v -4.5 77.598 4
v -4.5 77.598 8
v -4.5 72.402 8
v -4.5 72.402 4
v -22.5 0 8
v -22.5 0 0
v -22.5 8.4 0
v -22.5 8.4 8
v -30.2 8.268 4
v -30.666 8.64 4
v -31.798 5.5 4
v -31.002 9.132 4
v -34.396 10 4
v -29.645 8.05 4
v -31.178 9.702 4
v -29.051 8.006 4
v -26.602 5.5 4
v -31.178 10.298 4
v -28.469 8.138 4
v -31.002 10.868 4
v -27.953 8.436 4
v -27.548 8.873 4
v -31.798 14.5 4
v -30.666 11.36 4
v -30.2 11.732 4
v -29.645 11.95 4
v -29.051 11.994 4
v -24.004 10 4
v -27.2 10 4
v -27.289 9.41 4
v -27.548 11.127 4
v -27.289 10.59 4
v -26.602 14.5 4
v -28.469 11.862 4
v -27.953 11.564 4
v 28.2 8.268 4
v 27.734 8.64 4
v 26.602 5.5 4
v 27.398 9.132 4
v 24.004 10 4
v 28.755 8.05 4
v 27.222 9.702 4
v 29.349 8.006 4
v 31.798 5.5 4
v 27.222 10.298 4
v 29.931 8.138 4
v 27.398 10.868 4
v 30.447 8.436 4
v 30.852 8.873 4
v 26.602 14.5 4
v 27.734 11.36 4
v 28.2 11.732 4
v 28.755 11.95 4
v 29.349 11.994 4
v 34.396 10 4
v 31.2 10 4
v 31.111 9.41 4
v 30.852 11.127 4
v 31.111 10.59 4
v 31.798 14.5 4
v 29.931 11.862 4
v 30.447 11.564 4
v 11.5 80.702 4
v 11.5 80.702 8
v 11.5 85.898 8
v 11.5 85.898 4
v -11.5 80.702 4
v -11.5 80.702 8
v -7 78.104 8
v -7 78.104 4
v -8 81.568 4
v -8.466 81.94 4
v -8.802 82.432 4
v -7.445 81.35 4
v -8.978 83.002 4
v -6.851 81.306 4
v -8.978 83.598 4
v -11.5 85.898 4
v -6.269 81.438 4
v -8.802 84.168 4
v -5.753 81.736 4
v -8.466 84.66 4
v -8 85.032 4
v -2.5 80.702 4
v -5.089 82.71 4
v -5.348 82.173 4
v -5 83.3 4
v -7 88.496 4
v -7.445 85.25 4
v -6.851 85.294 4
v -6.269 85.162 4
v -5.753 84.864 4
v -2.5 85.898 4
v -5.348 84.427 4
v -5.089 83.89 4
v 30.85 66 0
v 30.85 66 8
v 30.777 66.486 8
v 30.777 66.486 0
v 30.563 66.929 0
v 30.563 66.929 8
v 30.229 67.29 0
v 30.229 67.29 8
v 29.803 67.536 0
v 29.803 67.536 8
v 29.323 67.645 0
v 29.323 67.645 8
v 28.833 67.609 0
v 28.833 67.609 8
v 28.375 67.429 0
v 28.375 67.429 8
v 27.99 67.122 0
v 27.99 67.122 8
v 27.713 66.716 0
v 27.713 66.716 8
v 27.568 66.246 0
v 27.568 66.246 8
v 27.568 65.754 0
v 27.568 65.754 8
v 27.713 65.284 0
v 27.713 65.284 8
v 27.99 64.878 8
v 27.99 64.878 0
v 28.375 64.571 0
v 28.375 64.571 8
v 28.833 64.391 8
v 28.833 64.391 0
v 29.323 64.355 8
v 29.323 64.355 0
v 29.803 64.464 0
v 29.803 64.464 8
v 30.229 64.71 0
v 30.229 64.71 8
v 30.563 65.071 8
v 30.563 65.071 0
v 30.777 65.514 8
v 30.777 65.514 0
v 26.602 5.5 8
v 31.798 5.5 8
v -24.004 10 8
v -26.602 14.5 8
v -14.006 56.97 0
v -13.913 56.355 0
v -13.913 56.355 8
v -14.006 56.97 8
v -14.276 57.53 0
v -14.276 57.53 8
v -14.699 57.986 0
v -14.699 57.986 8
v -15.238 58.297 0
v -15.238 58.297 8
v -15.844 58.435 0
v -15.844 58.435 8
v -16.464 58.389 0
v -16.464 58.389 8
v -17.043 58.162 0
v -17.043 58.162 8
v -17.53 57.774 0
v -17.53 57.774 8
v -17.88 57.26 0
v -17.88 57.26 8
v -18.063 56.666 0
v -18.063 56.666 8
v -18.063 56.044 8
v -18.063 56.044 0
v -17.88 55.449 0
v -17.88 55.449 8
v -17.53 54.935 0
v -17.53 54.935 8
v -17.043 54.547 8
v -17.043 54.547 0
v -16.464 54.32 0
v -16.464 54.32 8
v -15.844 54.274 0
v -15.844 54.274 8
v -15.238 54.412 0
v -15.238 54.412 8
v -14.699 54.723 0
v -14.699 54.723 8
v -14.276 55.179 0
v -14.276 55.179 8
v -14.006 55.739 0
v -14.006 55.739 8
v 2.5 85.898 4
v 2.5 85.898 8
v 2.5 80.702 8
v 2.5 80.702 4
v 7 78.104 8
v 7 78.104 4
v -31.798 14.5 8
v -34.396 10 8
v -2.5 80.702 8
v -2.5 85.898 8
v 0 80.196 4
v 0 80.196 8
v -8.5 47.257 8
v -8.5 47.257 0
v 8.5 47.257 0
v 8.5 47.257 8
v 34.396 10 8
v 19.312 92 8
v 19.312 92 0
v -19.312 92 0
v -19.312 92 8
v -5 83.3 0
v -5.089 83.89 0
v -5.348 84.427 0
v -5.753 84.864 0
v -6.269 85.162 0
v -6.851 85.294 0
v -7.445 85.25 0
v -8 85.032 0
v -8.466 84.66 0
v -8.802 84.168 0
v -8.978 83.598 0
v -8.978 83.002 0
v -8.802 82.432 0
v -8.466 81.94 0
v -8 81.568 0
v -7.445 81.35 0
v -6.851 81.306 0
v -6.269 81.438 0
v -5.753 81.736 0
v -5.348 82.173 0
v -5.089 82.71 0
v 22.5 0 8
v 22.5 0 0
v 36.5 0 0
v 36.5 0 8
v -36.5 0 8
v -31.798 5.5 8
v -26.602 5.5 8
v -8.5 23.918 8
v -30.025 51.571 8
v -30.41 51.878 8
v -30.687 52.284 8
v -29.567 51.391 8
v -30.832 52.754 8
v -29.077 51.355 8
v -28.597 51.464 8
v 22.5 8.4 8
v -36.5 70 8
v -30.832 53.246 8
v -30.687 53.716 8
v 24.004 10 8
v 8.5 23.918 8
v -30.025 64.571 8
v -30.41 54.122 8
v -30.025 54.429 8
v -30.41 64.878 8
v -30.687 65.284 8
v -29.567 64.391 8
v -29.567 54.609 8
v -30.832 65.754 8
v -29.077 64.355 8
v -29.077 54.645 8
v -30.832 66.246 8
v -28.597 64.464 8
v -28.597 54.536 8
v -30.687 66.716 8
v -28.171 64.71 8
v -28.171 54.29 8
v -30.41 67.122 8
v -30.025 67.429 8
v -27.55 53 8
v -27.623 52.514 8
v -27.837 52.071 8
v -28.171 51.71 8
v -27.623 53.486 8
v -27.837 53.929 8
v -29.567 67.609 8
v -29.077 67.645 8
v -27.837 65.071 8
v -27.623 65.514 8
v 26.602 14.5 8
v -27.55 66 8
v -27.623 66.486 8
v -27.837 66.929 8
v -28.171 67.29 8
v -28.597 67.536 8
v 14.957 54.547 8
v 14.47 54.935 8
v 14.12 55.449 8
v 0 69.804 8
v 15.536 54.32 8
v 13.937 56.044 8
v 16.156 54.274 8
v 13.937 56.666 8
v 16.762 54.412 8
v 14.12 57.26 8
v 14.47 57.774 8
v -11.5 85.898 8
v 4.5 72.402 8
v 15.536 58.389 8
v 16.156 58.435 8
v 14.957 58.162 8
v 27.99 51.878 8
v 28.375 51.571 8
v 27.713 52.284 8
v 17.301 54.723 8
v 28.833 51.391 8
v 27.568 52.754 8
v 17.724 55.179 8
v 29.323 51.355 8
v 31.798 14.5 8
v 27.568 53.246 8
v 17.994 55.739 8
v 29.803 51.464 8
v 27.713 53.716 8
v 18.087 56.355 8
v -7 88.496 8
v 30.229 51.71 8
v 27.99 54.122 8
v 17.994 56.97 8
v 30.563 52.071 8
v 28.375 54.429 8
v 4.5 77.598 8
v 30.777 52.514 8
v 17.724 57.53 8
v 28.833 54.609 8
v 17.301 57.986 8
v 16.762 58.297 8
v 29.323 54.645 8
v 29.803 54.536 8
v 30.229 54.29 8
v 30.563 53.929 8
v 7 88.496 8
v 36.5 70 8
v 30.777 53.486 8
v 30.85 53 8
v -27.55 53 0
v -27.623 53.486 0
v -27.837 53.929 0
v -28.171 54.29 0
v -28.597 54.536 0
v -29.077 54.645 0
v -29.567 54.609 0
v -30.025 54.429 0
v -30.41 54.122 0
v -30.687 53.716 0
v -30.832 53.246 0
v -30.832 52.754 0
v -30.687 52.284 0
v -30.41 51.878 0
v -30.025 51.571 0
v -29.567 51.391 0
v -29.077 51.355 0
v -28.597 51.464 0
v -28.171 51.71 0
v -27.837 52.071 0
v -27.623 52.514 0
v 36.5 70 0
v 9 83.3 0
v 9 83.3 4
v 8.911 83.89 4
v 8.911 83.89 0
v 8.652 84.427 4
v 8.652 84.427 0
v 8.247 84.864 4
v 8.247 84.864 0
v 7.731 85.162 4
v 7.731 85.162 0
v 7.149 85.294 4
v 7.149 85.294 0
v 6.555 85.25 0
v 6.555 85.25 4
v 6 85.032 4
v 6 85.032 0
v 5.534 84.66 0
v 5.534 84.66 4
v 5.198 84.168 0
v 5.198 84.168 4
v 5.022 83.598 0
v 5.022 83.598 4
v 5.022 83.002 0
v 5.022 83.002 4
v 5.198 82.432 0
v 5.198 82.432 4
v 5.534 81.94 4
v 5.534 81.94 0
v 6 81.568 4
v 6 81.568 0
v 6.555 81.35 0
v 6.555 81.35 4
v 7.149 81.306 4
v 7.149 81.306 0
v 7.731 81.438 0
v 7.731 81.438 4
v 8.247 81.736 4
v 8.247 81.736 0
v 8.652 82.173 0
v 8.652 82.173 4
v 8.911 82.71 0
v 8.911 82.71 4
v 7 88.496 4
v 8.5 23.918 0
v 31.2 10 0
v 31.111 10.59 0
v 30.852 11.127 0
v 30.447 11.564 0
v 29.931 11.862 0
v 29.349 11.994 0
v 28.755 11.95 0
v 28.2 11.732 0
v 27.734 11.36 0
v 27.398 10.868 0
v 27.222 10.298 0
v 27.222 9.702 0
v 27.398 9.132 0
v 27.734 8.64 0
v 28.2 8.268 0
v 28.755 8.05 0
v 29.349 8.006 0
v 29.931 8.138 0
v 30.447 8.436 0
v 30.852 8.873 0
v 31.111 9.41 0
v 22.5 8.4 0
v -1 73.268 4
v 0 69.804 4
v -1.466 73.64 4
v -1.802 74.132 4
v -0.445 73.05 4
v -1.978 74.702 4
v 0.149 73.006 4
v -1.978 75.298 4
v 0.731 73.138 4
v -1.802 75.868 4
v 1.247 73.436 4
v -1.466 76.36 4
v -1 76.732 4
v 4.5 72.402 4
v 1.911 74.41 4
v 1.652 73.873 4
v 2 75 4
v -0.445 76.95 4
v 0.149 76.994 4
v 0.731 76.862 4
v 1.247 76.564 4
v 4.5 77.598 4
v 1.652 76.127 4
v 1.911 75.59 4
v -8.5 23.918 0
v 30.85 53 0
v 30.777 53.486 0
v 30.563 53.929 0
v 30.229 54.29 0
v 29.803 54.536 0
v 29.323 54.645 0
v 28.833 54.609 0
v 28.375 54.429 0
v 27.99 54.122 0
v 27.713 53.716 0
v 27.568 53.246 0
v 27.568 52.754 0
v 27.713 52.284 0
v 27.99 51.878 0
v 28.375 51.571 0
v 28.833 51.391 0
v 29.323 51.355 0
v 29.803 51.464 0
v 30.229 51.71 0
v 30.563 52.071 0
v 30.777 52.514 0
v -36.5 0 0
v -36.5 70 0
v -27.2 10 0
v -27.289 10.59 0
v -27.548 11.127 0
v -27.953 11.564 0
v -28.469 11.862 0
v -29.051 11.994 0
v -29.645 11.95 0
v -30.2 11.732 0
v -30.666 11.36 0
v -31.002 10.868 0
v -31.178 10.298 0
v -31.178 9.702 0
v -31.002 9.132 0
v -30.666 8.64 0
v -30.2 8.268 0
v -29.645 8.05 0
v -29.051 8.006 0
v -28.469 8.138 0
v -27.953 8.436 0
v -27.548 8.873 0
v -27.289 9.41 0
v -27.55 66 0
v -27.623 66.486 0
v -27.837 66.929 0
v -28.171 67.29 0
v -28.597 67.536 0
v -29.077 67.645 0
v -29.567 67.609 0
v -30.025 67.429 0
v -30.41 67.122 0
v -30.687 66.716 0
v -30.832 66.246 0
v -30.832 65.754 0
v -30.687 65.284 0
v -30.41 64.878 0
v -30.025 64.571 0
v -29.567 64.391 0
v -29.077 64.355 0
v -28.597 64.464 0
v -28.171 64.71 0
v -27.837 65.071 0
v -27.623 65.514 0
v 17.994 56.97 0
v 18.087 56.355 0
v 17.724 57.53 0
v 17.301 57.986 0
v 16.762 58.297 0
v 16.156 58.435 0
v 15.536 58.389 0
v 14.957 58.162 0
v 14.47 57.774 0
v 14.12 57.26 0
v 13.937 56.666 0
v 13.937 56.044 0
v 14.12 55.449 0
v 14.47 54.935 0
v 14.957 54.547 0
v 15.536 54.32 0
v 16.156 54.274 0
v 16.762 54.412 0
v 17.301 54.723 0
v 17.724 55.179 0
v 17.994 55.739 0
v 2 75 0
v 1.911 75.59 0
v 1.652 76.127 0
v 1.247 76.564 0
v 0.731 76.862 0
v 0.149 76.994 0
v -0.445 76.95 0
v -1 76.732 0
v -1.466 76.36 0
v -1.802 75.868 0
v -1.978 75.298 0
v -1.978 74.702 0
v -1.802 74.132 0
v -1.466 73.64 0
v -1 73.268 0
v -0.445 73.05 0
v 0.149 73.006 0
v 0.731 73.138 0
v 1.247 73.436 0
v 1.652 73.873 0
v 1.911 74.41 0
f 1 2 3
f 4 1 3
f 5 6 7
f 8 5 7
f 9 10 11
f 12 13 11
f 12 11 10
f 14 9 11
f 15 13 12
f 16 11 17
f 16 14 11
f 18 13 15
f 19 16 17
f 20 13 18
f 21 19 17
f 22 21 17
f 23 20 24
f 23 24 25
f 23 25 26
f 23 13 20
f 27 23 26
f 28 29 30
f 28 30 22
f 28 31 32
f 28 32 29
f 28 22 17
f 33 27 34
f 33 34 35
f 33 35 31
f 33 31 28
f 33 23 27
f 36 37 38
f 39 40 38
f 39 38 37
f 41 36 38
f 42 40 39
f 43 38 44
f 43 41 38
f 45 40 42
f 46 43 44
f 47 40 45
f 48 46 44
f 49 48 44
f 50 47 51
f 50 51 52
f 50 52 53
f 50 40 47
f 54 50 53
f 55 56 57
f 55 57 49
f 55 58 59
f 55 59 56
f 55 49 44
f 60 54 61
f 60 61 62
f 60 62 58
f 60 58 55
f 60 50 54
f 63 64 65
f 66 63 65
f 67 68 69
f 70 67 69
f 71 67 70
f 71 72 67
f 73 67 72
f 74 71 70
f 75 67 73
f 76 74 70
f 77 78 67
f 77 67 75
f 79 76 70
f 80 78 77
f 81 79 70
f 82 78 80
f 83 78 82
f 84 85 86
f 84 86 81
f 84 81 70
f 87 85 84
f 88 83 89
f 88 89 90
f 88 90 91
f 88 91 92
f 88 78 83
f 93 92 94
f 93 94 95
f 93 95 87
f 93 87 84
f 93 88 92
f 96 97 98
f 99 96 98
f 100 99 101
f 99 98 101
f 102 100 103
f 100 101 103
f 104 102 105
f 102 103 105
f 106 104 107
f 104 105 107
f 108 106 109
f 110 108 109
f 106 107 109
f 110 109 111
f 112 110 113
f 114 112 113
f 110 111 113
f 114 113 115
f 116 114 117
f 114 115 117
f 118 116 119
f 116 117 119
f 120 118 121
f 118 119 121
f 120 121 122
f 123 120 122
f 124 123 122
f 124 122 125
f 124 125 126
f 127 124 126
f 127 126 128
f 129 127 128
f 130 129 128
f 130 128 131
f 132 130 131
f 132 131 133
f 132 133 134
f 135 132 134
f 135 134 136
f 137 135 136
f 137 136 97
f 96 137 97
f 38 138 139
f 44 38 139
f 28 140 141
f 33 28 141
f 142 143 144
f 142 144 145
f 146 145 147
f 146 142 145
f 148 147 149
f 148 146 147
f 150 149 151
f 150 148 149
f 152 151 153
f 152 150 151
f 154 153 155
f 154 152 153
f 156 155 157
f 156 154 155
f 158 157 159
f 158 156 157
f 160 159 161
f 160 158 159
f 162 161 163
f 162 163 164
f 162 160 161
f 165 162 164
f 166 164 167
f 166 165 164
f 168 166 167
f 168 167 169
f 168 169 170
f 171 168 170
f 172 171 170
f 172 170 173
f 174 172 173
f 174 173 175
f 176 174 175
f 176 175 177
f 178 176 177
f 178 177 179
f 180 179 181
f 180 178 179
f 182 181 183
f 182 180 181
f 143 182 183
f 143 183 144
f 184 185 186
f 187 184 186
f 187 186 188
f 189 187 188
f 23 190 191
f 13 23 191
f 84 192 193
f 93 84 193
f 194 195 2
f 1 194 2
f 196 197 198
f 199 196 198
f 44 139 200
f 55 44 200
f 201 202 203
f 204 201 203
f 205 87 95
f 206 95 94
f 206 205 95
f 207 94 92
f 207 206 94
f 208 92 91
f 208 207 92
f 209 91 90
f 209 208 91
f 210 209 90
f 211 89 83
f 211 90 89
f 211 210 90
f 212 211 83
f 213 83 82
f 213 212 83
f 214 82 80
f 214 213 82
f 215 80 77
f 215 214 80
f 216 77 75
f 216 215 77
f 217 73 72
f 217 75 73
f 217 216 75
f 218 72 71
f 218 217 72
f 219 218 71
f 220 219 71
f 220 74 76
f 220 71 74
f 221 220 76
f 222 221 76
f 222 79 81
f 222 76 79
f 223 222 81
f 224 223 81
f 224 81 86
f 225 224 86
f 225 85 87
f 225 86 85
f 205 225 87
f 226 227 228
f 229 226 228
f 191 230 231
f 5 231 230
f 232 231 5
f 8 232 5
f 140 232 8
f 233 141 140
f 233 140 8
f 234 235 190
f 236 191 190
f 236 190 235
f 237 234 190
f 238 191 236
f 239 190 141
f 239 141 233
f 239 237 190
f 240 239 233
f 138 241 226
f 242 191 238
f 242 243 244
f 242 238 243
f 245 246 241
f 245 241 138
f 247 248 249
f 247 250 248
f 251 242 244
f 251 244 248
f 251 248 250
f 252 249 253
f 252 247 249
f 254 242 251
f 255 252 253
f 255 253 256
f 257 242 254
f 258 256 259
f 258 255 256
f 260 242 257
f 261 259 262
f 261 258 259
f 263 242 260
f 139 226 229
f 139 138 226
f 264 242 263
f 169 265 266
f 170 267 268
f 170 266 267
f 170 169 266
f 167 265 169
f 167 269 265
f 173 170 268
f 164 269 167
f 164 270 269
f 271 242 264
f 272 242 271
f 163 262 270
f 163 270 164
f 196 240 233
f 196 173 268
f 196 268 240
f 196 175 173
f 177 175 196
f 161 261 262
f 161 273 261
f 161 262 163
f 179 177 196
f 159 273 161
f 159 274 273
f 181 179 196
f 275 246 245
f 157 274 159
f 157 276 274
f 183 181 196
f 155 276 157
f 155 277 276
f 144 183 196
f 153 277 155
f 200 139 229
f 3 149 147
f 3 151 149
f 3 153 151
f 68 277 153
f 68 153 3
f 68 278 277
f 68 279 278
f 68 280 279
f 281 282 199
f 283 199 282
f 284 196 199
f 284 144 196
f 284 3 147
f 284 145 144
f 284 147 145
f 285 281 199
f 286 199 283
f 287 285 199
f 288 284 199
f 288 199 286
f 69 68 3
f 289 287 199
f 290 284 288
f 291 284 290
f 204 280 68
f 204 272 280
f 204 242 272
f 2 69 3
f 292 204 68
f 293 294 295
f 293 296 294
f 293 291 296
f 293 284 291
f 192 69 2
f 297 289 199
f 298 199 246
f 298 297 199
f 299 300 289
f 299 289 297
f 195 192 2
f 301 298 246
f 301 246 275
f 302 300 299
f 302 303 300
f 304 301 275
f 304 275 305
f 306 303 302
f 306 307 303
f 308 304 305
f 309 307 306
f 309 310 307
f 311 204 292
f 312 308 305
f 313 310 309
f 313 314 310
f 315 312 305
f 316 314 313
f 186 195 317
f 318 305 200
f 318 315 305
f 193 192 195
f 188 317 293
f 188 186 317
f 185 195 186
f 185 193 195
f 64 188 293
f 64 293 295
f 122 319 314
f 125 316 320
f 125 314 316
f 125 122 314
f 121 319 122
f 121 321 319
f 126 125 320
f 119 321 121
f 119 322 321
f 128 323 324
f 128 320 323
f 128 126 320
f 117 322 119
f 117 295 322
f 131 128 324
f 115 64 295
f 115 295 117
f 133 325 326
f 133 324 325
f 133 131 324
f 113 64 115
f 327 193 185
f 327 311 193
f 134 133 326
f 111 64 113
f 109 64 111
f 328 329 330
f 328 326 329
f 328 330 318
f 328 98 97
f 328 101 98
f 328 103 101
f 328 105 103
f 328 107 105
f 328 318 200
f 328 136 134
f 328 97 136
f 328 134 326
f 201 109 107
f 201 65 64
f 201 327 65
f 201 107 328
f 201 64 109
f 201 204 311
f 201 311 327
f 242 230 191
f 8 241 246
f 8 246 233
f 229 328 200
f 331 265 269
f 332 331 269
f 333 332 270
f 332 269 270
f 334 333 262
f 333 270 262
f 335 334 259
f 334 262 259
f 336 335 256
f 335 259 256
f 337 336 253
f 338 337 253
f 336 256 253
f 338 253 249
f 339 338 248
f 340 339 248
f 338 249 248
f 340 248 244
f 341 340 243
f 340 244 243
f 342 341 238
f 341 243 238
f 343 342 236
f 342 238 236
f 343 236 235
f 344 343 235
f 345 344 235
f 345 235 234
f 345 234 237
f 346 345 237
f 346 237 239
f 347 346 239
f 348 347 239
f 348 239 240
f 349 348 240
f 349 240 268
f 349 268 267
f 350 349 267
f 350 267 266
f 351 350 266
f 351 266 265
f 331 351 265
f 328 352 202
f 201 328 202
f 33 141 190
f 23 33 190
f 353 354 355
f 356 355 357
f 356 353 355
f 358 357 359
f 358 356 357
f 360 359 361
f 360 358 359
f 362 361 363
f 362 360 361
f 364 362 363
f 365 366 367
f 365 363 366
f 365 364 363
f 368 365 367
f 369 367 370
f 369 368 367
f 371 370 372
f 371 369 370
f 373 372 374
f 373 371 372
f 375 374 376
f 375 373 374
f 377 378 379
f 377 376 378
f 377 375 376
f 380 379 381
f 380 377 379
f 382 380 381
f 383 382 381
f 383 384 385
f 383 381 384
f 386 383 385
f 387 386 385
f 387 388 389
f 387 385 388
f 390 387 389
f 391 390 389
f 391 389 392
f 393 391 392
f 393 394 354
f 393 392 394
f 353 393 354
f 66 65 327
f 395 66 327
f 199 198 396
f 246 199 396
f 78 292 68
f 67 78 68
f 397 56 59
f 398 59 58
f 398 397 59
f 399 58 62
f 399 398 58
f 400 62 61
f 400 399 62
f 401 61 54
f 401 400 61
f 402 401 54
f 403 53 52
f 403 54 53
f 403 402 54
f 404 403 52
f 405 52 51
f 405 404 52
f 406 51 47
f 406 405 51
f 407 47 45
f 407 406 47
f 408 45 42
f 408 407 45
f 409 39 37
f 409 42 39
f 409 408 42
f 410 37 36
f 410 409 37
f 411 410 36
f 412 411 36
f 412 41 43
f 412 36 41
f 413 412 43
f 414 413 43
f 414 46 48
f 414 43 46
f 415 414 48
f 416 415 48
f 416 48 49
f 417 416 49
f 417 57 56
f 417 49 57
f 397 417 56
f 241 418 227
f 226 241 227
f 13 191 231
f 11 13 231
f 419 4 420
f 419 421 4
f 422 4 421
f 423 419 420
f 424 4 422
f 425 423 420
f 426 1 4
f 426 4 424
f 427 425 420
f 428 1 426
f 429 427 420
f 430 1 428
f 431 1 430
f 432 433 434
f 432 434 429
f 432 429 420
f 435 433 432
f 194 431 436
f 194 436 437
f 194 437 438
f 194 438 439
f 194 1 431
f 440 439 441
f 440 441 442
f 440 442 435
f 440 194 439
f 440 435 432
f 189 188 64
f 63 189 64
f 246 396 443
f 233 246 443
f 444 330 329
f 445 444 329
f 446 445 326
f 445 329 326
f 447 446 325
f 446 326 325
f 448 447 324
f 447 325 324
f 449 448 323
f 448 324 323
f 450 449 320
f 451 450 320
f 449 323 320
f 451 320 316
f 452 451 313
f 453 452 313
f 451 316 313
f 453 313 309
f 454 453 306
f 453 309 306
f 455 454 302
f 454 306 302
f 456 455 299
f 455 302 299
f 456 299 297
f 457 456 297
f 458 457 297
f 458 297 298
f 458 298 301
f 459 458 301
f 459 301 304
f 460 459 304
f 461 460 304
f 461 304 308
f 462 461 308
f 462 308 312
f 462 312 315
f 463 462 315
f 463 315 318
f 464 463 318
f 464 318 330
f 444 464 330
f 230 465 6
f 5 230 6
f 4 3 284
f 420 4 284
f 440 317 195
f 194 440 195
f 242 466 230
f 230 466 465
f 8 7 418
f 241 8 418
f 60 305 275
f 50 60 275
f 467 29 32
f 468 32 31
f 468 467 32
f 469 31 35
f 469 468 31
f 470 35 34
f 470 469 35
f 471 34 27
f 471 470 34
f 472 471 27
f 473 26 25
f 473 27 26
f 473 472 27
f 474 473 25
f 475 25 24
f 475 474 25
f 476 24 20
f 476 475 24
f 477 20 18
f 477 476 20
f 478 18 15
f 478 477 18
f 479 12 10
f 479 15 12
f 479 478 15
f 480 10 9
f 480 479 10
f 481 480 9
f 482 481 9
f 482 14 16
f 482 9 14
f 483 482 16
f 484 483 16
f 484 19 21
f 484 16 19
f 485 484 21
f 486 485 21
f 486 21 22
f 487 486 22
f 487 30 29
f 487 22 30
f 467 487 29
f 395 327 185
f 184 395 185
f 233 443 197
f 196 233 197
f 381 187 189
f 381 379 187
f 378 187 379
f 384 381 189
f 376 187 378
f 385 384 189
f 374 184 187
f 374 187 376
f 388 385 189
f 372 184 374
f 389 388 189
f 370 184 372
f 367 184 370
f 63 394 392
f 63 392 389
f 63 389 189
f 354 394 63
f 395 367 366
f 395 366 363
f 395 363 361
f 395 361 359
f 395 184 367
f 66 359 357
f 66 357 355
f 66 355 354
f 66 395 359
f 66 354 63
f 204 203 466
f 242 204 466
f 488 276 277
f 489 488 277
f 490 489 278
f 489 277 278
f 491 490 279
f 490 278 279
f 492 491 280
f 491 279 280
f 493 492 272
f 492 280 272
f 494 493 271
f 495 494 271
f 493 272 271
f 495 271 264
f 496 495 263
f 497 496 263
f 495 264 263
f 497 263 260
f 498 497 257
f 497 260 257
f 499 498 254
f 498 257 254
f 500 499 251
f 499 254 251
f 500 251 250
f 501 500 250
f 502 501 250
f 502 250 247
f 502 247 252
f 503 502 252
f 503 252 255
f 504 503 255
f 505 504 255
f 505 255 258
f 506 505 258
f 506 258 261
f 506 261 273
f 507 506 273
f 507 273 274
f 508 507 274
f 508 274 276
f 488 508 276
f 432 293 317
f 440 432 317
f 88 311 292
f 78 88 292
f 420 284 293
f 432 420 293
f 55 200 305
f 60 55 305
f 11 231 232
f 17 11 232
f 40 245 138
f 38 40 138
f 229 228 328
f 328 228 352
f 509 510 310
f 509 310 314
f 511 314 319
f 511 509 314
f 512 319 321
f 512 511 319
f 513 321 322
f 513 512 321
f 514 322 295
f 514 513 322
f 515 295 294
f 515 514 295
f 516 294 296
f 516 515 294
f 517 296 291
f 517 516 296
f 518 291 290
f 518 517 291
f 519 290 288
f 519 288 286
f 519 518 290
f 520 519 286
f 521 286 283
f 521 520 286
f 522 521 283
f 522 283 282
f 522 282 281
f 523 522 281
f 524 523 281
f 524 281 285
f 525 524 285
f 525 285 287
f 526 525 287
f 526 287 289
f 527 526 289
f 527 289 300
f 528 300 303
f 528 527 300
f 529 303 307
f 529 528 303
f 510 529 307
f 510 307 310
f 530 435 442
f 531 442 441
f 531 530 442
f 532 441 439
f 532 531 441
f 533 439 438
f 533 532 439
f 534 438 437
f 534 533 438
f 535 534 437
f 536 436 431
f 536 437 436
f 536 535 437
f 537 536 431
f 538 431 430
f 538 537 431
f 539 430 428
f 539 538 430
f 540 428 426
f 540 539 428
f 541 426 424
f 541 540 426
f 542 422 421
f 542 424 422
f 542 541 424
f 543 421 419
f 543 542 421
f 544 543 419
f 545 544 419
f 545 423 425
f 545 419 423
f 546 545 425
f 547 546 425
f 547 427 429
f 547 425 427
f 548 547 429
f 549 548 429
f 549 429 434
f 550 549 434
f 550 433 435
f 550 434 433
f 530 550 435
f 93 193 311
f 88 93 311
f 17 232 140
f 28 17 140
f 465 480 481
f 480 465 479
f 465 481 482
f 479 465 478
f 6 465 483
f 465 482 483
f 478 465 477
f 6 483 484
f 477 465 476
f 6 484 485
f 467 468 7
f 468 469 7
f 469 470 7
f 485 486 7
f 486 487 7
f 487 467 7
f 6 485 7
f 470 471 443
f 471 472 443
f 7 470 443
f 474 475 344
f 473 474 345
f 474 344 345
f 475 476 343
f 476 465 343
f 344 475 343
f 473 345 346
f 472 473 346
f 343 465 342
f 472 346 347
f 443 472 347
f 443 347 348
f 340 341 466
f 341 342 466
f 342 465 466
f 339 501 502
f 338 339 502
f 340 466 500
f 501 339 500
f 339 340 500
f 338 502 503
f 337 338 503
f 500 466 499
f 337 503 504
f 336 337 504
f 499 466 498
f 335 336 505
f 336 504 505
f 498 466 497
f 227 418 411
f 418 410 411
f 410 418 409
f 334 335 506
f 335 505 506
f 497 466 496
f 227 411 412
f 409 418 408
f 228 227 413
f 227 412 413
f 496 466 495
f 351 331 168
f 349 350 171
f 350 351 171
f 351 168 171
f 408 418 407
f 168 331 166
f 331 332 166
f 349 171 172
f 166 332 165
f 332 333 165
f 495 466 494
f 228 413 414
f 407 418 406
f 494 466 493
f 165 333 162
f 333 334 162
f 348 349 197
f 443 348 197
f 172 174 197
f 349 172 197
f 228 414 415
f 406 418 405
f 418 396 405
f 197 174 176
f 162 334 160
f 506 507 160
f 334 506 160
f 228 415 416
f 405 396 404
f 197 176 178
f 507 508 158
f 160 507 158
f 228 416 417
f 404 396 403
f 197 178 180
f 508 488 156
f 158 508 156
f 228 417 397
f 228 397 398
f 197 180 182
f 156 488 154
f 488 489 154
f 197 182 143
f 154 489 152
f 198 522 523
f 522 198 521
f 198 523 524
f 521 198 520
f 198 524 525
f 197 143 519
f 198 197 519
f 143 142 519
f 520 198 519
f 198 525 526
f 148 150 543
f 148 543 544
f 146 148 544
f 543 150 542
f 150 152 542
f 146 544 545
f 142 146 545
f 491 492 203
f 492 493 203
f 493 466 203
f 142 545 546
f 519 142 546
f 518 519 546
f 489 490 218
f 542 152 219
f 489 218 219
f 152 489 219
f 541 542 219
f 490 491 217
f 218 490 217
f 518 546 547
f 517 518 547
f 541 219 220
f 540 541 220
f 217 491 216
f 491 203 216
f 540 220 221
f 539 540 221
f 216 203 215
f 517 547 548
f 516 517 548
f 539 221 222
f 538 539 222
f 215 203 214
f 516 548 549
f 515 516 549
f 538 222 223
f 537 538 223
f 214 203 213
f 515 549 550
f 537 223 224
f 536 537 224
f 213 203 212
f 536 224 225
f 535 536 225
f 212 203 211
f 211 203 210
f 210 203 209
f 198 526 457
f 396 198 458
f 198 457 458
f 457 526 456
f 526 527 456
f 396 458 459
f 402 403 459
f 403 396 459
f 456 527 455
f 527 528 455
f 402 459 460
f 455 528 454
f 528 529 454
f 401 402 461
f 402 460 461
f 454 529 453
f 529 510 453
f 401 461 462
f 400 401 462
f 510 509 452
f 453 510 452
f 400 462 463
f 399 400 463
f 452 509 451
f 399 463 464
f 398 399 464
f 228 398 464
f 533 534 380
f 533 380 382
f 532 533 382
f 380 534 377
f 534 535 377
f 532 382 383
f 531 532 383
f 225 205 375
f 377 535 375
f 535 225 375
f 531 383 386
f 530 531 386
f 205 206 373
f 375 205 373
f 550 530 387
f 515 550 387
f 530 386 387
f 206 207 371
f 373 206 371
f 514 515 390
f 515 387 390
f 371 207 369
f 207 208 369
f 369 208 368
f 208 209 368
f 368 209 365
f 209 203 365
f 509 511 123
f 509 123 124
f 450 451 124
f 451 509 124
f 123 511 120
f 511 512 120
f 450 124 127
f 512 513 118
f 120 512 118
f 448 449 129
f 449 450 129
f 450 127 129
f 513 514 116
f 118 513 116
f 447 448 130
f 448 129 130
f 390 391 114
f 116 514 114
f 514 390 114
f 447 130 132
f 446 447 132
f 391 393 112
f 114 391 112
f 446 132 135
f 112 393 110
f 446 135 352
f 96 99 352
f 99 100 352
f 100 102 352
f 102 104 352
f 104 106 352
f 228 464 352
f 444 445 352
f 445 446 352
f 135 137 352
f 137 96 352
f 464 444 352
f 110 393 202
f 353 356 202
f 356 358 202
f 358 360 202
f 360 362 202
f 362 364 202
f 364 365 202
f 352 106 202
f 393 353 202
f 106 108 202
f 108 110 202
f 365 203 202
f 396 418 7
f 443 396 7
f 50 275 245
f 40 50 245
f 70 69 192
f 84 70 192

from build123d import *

# Parameters (mm, degrees)
ESBO_O1_R                = 2
ESBO_O1_R_2              = 2.086716092
ESBO_O1_R_3              = 2.086717953
RESSALTO_EXTRUS_O1_DEPTH = 8
ESBO_O4_R                = 1.65
CORTE_EXTRUS_O1_DEPTH    = 100.298791533
CORTE_EXTRUS_O2_DEPTH    = 4


with BuildPart() as part:
    # Esboço1 → Ressalto-extrusão1 (new body)
    with BuildSketch(Plane.XY):
        Polygon((19.311716217, 92), (-19.311716217, 92), (-36.5, 70), (-36.5, 0), (-22.499999998, 0), (-22.499999998, 8.400000004), (22.499999998, 8.400000004), (22.499999998, 0), (36.5, 0), (36.5, 70), align=None)
        with Locations((0, 75)):
            Circle(ESBO_O1_R, mode=Mode.SUBTRACT)
        with Locations((-7, 83.3)):
            Circle(ESBO_O1_R, mode=Mode.SUBTRACT)
        with Locations((7, 83.3)):
            Circle(ESBO_O1_R, mode=Mode.SUBTRACT)
        with Locations((-29.2, 10)):
            Circle(ESBO_O1_R, mode=Mode.SUBTRACT)
        with Locations((29.2, 10)):
            Circle(ESBO_O1_R, mode=Mode.SUBTRACT)
        with Locations((-16, 56.354540575)):
            Circle(ESBO_O1_R_2, mode=Mode.SUBTRACT)
        with Locations((16, 56.354540575)):
            Circle(ESBO_O1_R_3, mode=Mode.SUBTRACT)
        Polygon((0, 47.257129716), (8.5, 47.257129716), (8.5, 23.917682695), (0, 23.917682695), (-8.5, 23.917682695), (-8.5, 47.257129716), align=None, mode=Mode.SUBTRACT)
    extrude(amount=RESSALTO_EXTRUS_O1_DEPTH)

    # Esboço4 → Corte-extrusão1 (cut, through all)
    with BuildSketch(Plane.XY.offset(8)):
        with Locations((-29.2, 66)):
            Circle(ESBO_O4_R)
        with Locations((-29.2, 53)):
            Circle(ESBO_O4_R)
        with Locations((29.2, 53)):
            Circle(ESBO_O4_R)
        with Locations((29.2, 66)):
            Circle(ESBO_O4_R)
    extrude(amount=-CORTE_EXTRUS_O1_DEPTH, mode=Mode.SUBTRACT)

    # Esboço5 → Corte-extrusão2 (cut)
    with BuildSketch(Plane.XY.offset(8)):
        Polygon((4.5, 72.401923789), (4.5, 77.598076211), (0, 80.196152423), (-4.5, 77.598076211), (-4.5, 72.401923789), (0, 69.803847577), align=None)
        Polygon((-26.601923789, 14.5), (-31.798076211, 14.5), (-34.396152423, 10), (-31.798076211, 5.5), (-26.601923789, 5.5), (-24.003847577, 10), align=None)
        Polygon((-11.5, 80.701923789), (-7, 78.103847577), (-2.5, 80.701923789), (-2.5, 85.898076211), (-7, 88.496152423), (-11.5, 85.898076211), align=None)
        Polygon((11.5, 80.701923789), (11.5, 85.898076211), (7, 88.496152423), (2.5, 85.898076211), (2.5, 80.701923789), (7, 78.103847577), align=None)
        Polygon((31.798076211, 5.5), (34.396152423, 10), (31.798076211, 14.5), (26.601923789, 14.5), (24.003847577, 10), (26.601923789, 5.5), align=None)
    extrude(amount=-CORTE_EXTRUS_O2_DEPTH, mode=Mode.SUBTRACT)


solid = part.part
